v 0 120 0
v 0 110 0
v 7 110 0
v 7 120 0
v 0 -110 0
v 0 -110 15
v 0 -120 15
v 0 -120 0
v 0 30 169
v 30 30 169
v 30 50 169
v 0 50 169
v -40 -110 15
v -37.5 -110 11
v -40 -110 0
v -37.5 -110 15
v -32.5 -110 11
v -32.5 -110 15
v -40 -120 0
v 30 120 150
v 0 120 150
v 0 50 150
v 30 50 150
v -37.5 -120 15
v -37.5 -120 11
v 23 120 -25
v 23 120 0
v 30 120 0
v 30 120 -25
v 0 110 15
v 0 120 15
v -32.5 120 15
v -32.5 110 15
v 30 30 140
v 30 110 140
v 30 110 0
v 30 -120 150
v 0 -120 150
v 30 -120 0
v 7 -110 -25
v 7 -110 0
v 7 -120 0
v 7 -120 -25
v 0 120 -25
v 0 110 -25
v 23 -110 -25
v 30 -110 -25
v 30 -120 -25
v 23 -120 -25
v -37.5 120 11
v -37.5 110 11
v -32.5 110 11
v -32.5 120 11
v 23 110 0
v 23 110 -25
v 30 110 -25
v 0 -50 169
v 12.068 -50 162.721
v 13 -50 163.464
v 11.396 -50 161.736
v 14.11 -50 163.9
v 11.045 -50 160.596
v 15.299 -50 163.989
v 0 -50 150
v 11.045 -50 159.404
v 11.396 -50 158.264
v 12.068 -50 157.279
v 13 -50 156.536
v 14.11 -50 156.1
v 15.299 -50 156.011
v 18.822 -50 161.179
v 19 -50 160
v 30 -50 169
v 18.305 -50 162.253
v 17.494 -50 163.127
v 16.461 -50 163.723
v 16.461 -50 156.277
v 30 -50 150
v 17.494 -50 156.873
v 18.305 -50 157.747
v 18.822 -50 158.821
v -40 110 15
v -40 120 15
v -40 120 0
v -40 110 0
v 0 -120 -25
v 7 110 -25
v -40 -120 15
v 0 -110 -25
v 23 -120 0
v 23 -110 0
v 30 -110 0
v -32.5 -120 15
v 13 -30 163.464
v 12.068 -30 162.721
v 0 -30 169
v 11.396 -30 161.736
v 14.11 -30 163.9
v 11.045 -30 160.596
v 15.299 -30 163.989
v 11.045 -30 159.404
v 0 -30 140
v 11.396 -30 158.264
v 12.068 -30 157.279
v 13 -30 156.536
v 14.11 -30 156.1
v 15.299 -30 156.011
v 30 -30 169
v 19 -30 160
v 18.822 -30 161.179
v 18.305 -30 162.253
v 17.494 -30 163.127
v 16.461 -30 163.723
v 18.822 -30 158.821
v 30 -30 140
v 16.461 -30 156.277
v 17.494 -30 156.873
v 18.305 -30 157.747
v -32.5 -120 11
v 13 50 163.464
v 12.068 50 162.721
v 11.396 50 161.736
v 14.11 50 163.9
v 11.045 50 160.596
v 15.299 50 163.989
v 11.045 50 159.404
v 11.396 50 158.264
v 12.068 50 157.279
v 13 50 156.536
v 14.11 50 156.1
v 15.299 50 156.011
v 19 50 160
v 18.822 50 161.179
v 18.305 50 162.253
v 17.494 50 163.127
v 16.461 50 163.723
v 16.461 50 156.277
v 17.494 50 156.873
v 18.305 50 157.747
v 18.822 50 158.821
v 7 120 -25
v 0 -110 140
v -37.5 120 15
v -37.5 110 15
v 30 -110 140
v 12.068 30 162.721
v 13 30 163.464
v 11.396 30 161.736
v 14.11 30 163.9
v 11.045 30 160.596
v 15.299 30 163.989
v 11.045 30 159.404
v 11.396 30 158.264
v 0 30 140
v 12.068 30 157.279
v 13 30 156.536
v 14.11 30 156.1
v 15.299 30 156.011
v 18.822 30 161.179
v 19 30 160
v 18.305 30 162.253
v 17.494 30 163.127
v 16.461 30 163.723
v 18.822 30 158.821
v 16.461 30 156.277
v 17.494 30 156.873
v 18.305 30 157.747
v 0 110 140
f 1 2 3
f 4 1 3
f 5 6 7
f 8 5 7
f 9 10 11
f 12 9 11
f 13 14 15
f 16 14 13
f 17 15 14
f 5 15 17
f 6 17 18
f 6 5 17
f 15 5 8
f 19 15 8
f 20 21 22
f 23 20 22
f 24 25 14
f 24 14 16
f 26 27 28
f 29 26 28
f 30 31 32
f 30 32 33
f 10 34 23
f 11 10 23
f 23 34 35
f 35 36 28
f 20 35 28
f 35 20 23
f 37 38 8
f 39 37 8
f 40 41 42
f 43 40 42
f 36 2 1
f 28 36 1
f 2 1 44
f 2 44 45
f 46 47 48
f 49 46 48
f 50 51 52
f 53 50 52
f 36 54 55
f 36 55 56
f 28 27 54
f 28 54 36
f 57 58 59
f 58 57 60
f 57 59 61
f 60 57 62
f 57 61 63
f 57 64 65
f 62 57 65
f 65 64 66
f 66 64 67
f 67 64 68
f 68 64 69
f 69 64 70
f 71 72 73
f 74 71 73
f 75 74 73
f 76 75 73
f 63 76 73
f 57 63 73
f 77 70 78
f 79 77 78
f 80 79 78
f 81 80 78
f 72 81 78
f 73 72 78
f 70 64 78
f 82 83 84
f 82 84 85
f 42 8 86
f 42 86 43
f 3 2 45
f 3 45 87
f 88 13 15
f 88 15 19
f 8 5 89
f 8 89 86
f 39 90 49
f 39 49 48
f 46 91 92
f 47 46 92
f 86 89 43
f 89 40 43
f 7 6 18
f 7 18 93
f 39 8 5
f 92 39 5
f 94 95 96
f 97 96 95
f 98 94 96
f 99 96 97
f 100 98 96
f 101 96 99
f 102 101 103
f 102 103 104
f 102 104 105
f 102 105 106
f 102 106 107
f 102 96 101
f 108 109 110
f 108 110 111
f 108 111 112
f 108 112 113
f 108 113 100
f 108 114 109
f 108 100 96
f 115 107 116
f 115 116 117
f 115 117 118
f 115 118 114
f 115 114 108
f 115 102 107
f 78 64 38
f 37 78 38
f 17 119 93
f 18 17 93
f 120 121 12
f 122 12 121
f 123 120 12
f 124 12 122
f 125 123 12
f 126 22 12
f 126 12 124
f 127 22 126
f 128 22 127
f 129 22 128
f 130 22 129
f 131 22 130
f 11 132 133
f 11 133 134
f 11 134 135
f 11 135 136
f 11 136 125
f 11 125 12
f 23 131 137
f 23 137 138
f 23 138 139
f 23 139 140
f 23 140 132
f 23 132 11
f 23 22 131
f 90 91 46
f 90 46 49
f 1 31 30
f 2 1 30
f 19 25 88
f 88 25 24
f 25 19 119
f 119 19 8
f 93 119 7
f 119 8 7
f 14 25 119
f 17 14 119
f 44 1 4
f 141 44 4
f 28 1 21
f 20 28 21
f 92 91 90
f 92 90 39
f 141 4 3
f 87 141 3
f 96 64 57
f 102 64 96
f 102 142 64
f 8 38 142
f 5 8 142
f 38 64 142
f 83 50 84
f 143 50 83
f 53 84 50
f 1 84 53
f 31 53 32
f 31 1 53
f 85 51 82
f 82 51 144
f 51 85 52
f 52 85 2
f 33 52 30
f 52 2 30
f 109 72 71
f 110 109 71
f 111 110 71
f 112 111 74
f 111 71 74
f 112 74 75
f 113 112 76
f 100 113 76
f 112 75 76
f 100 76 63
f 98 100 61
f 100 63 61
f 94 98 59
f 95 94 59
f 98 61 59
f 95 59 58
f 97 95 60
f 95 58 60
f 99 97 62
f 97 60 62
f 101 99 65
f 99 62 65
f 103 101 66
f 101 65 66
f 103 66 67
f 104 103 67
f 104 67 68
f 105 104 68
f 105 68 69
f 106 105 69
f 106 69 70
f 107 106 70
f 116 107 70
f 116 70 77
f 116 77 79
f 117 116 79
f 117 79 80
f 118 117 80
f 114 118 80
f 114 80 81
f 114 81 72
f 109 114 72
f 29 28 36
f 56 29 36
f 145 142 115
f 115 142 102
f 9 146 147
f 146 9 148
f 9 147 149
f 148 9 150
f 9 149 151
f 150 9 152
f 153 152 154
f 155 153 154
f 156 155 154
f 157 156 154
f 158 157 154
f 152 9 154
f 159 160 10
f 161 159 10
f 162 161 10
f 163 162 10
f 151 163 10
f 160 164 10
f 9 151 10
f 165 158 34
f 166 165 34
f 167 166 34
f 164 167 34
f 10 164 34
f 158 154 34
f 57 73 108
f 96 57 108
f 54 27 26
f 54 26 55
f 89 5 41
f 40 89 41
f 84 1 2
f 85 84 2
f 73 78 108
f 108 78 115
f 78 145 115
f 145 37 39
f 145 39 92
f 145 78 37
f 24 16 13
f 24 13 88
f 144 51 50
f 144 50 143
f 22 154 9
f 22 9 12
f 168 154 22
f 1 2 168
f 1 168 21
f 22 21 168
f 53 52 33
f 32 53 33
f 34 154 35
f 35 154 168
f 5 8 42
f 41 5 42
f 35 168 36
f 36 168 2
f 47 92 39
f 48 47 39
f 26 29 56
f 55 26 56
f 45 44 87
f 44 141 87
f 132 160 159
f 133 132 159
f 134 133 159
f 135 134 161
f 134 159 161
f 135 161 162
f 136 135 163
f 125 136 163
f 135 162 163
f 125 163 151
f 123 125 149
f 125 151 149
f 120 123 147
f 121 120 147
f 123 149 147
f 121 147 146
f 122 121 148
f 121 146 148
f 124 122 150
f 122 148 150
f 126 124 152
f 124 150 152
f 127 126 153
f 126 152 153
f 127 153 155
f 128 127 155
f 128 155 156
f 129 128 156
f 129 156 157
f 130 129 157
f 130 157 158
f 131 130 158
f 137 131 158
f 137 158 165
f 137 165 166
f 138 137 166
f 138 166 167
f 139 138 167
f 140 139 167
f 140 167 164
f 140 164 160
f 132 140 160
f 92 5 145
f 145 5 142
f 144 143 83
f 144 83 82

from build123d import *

# Parameters (mm, degrees)
F1_DEPTH  = 30
F2_W      = 30
F2_H      = 20
F3_DEPTH  = 20
F4_W      = 30
F4_H      = 20
F5_DEPTH  = 20
F7_D      = 8
F7_2_D    = 8
F8_W      = 7
F8_H      = 10
F9_DEPTH  = 30
F10_W     = 10
F10_H     = 15
F11_DEPTH = 40
F12_W     = 5
F12_H     = 4
F13_DEPTH = 240.001
F14_W     = 5
F14_H     = 4
F15_DEPTH = 240.001
F17_DEPTH = 69


with BuildPart() as f1:
    # F0 (on Right) → F1 (new body)
    with BuildSketch(Plane.YZ):
        Polygon((-120, 150), (-120, 0), (-110, 0), (-110, 140), (-30, 140), (-30, 150), align=None)
    extrude(amount=F1_DEPTH)

    # F2 (on face) → F3 (join)
    with BuildSketch(Plane.XY.offset(150)):
        with Locations((15, -40)):
            Rectangle(F2_W, F2_H)
    extrude(amount=F3_DEPTH)

    # F7 (through all)
    with Locations(Plane(origin=(0, 50, 0), x_dir=(-1, 0, 0), z_dir=(0, 1, 0))):
        with Locations((-15, 160)):
            Hole(F7_D / 2)

    # F14 (on face) → F15 (cut, through all)
    with BuildSketch(Plane(origin=(0, 120, 0), x_dir=(-1, 0, 0), z_dir=(0, 1, 0))):
        with Locations((35, 13)):
            Rectangle(F14_W, F14_H)
    extrude(amount=-F15_DEPTH, mode=Mode.SUBTRACT)


with BuildPart() as f1b:
    # F0 (on Right) → F1, piece 2 (new body)
    with BuildSketch(Plane.YZ):
        Polygon((110, 140), (110, 0), (120, 0), (120, 150), (30, 150), (30, 140), align=None)
    extrude(amount=F1_DEPTH)

    # F4 (on face) → F5 (join)
    with BuildSketch(Plane.XY.offset(150)):
        with Locations((15, 40)):
            Rectangle(F4_W, F4_H)
    extrude(amount=F5_DEPTH)

    # F7#2 (through all)
    with Locations(Plane(origin=(0, 50, 0), x_dir=(-1, 0, 0), z_dir=(0, 1, 0))):
        with Locations((-15, 160)):
            Hole(F7_2_D / 2)


with BuildPart() as f9:
    # F8 (on face) → F9 (new body)
    with BuildSketch(Plane(origin=(0, 0, 0), x_dir=(1, 0, 0), z_dir=(0, 0, -1))):
        with Locations((26.5, -115)):
            Rectangle(F8_W, F8_H)
    extrude(amount=F9_DEPTH)


with BuildPart() as f9b:
    # F8 (on face) → F9, piece 2 (new body)
    with BuildSketch(Plane(origin=(0, 0, 0), x_dir=(1, 0, 0), z_dir=(0, 0, -1))):
        with Locations((3.5, -115)):
            Rectangle(F8_W, F8_H)
    extrude(amount=F9_DEPTH)


with BuildPart() as f9c:
    # F8 (on face) → F9, piece 3 (new body)
    with BuildSketch(Plane(origin=(0, 0, 0), x_dir=(1, 0, 0), z_dir=(0, 0, -1))):
        with Locations((26.5, 115)):
            Rectangle(F8_W, F8_H)
    extrude(amount=F9_DEPTH)


with BuildPart() as f9d:
    # F8 (on face) → F9, piece 4 (new body)
    with BuildSketch(Plane(origin=(0, 0, 0), x_dir=(1, 0, 0), z_dir=(0, 0, -1))):
        with Locations((3.5, 115)):
            Rectangle(F8_W, F8_H)
    extrude(amount=F9_DEPTH)


with BuildPart() as f11:
    # F10 (on face) → F11 (new body)
    with BuildSketch(Plane(origin=(0, 0, 0), x_dir=(0, -1, 0), z_dir=(-1, 0, 0))):
        with Locations((-115, 7.5)):
            Rectangle(F10_W, F10_H)
    extrude(amount=F11_DEPTH)


with BuildPart() as f11b:
    # F10 (on face) → F11, piece 2 (new body)
    with BuildSketch(Plane(origin=(0, 0, 0), x_dir=(0, -1, 0), z_dir=(-1, 0, 0))):
        with Locations((115, 7.5)):
            Rectangle(F10_W, F10_H)
    extrude(amount=F11_DEPTH)


with BuildPart() as f13_tool:
    # F12 (on face) → F13 (new body, through all)
    with BuildSketch(Plane.XZ.offset(120)):
        with Locations((-35, 13)):
            Rectangle(F12_W, F12_H)
    extrude(amount=-F13_DEPTH)


with BuildPart() as f11_1:
    add(f11.part)

    # F13: cut by f13_tool
    add(f13_tool.part, mode=Mode.SUBTRACT)


with BuildPart() as f11b_1:
    add(f11b.part)

    # F13: cut by f13_tool
    add(f13_tool.part, mode=Mode.SUBTRACT)


with BuildPart() as f17_tool:
    # F16 (on face) → F17 (new body)
    with BuildSketch(Plane.YZ.offset(30)):
        Polygon((-57.1639947593, 169), (-30, 169), (57.6231703162, 169), (57.6231703162, 174.4881868362), (-57.1639947593, 174.4881868362), align=None)
        Polygon((137.1954828501, -25), (-110, -25), (-131.8146437407, -25), (-131.8146437407, -34.2673361301), (137.1954828501, -34.2673361301), align=None)
    extrude(amount=-F17_DEPTH)


with BuildPart() as f1_1:
    add(f1.part)

    # F17: cut by f17_tool
    add(f17_tool.part, mode=Mode.SUBTRACT)


with BuildPart() as f1b_1:
    add(f1b.part)

    # F17: cut by f17_tool
    add(f17_tool.part, mode=Mode.SUBTRACT)


with BuildPart() as f9_1:
    add(f9.part)

    # F17: cut by f17_tool
    add(f17_tool.part, mode=Mode.SUBTRACT)


with BuildPart() as f9b_1:
    add(f9b.part)

    # F17: cut by f17_tool
    add(f17_tool.part, mode=Mode.SUBTRACT)


with BuildPart() as f9c_1:
    add(f9c.part)

    # F17: cut by f17_tool
    add(f17_tool.part, mode=Mode.SUBTRACT)


with BuildPart() as f9d_1:
    add(f9d.part)

    # F17: cut by f17_tool
    add(f17_tool.part, mode=Mode.SUBTRACT)


solid = Compound([f11_1.part, f11b_1.part, f1_1.part, f1b_1.part, f9_1.part, f9b_1.part, f9c_1.part, f9d_1.part])
